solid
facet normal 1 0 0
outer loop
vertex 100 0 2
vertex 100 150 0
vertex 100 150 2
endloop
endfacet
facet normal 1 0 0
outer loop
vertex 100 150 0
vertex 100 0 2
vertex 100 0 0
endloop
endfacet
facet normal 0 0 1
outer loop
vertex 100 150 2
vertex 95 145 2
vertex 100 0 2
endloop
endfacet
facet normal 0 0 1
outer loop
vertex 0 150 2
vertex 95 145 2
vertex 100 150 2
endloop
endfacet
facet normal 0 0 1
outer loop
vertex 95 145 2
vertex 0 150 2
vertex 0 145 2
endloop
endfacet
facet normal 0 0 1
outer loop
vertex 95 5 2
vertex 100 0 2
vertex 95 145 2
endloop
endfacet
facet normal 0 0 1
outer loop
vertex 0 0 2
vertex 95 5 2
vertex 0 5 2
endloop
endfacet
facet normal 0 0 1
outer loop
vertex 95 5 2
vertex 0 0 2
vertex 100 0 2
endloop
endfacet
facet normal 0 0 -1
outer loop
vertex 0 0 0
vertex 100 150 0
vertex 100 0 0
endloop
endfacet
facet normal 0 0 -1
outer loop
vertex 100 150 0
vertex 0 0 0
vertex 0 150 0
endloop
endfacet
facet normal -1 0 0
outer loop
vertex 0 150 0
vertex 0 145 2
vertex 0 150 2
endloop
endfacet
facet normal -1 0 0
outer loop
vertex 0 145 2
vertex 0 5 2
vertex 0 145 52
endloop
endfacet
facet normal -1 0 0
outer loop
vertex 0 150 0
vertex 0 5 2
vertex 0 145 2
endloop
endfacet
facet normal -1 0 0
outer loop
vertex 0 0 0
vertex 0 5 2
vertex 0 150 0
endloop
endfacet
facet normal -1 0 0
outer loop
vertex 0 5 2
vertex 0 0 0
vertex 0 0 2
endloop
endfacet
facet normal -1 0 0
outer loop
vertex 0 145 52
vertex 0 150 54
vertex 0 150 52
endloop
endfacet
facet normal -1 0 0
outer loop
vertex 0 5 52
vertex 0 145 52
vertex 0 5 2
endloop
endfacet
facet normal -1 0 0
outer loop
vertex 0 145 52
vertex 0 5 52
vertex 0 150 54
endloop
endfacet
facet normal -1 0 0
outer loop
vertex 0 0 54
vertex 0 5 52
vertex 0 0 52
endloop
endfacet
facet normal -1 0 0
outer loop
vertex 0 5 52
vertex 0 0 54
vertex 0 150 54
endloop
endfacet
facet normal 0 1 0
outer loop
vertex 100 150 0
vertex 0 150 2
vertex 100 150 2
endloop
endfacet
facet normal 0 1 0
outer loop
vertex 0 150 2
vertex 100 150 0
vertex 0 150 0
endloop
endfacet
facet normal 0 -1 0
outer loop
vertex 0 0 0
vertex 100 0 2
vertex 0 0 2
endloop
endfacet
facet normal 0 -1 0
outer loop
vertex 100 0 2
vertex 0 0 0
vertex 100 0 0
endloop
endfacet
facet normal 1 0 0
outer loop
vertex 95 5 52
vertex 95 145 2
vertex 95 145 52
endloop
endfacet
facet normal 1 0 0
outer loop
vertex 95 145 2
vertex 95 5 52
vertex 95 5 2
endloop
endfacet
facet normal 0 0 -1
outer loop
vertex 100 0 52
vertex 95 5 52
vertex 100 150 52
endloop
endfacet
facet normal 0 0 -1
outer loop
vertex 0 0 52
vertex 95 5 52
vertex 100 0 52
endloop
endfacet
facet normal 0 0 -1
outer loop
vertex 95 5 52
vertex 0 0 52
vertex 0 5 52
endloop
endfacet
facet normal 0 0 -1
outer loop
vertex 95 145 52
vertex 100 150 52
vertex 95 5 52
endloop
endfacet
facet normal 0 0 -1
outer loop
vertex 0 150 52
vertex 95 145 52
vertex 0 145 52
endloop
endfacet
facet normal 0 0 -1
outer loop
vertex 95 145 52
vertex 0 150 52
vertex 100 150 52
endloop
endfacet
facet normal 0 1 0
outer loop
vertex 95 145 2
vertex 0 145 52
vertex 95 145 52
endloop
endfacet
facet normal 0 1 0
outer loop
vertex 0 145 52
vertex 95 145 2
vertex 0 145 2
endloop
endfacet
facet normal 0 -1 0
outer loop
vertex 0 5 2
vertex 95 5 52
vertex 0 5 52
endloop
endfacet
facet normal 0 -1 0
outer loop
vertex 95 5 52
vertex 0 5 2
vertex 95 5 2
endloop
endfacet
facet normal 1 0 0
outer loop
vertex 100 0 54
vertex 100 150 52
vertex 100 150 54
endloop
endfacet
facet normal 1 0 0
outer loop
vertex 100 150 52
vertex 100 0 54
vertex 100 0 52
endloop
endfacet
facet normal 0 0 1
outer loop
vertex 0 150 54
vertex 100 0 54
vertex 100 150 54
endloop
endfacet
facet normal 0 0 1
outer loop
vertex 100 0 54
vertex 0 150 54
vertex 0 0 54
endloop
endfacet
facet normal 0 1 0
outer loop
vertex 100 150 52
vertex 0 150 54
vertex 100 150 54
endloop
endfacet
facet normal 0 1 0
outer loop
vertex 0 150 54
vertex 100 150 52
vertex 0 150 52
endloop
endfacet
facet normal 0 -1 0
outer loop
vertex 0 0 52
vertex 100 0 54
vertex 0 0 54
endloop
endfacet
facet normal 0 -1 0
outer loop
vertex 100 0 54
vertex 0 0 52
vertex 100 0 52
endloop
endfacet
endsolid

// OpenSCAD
//Customizable Book - to demonstrate basics of OpenSCAD for the Open Source Lab book
// Right now most 3d printers can only print 1 color -- soon you will be able to map the attached image onto this book design.

//Width of book
w=100; 
// Length of book
l=150; 
//Cover thicknes of book
c= 2;  
//Thickness of book
t= 50; 
// Page inset
i=5; 

module book (){
cube([w,l,c]); //book cover
translate([0,i,c])cube([w-i,l-i*2,t]); //pages
translate([0,0,c+t])cube([w,l,c]); //book cover
}

book();
